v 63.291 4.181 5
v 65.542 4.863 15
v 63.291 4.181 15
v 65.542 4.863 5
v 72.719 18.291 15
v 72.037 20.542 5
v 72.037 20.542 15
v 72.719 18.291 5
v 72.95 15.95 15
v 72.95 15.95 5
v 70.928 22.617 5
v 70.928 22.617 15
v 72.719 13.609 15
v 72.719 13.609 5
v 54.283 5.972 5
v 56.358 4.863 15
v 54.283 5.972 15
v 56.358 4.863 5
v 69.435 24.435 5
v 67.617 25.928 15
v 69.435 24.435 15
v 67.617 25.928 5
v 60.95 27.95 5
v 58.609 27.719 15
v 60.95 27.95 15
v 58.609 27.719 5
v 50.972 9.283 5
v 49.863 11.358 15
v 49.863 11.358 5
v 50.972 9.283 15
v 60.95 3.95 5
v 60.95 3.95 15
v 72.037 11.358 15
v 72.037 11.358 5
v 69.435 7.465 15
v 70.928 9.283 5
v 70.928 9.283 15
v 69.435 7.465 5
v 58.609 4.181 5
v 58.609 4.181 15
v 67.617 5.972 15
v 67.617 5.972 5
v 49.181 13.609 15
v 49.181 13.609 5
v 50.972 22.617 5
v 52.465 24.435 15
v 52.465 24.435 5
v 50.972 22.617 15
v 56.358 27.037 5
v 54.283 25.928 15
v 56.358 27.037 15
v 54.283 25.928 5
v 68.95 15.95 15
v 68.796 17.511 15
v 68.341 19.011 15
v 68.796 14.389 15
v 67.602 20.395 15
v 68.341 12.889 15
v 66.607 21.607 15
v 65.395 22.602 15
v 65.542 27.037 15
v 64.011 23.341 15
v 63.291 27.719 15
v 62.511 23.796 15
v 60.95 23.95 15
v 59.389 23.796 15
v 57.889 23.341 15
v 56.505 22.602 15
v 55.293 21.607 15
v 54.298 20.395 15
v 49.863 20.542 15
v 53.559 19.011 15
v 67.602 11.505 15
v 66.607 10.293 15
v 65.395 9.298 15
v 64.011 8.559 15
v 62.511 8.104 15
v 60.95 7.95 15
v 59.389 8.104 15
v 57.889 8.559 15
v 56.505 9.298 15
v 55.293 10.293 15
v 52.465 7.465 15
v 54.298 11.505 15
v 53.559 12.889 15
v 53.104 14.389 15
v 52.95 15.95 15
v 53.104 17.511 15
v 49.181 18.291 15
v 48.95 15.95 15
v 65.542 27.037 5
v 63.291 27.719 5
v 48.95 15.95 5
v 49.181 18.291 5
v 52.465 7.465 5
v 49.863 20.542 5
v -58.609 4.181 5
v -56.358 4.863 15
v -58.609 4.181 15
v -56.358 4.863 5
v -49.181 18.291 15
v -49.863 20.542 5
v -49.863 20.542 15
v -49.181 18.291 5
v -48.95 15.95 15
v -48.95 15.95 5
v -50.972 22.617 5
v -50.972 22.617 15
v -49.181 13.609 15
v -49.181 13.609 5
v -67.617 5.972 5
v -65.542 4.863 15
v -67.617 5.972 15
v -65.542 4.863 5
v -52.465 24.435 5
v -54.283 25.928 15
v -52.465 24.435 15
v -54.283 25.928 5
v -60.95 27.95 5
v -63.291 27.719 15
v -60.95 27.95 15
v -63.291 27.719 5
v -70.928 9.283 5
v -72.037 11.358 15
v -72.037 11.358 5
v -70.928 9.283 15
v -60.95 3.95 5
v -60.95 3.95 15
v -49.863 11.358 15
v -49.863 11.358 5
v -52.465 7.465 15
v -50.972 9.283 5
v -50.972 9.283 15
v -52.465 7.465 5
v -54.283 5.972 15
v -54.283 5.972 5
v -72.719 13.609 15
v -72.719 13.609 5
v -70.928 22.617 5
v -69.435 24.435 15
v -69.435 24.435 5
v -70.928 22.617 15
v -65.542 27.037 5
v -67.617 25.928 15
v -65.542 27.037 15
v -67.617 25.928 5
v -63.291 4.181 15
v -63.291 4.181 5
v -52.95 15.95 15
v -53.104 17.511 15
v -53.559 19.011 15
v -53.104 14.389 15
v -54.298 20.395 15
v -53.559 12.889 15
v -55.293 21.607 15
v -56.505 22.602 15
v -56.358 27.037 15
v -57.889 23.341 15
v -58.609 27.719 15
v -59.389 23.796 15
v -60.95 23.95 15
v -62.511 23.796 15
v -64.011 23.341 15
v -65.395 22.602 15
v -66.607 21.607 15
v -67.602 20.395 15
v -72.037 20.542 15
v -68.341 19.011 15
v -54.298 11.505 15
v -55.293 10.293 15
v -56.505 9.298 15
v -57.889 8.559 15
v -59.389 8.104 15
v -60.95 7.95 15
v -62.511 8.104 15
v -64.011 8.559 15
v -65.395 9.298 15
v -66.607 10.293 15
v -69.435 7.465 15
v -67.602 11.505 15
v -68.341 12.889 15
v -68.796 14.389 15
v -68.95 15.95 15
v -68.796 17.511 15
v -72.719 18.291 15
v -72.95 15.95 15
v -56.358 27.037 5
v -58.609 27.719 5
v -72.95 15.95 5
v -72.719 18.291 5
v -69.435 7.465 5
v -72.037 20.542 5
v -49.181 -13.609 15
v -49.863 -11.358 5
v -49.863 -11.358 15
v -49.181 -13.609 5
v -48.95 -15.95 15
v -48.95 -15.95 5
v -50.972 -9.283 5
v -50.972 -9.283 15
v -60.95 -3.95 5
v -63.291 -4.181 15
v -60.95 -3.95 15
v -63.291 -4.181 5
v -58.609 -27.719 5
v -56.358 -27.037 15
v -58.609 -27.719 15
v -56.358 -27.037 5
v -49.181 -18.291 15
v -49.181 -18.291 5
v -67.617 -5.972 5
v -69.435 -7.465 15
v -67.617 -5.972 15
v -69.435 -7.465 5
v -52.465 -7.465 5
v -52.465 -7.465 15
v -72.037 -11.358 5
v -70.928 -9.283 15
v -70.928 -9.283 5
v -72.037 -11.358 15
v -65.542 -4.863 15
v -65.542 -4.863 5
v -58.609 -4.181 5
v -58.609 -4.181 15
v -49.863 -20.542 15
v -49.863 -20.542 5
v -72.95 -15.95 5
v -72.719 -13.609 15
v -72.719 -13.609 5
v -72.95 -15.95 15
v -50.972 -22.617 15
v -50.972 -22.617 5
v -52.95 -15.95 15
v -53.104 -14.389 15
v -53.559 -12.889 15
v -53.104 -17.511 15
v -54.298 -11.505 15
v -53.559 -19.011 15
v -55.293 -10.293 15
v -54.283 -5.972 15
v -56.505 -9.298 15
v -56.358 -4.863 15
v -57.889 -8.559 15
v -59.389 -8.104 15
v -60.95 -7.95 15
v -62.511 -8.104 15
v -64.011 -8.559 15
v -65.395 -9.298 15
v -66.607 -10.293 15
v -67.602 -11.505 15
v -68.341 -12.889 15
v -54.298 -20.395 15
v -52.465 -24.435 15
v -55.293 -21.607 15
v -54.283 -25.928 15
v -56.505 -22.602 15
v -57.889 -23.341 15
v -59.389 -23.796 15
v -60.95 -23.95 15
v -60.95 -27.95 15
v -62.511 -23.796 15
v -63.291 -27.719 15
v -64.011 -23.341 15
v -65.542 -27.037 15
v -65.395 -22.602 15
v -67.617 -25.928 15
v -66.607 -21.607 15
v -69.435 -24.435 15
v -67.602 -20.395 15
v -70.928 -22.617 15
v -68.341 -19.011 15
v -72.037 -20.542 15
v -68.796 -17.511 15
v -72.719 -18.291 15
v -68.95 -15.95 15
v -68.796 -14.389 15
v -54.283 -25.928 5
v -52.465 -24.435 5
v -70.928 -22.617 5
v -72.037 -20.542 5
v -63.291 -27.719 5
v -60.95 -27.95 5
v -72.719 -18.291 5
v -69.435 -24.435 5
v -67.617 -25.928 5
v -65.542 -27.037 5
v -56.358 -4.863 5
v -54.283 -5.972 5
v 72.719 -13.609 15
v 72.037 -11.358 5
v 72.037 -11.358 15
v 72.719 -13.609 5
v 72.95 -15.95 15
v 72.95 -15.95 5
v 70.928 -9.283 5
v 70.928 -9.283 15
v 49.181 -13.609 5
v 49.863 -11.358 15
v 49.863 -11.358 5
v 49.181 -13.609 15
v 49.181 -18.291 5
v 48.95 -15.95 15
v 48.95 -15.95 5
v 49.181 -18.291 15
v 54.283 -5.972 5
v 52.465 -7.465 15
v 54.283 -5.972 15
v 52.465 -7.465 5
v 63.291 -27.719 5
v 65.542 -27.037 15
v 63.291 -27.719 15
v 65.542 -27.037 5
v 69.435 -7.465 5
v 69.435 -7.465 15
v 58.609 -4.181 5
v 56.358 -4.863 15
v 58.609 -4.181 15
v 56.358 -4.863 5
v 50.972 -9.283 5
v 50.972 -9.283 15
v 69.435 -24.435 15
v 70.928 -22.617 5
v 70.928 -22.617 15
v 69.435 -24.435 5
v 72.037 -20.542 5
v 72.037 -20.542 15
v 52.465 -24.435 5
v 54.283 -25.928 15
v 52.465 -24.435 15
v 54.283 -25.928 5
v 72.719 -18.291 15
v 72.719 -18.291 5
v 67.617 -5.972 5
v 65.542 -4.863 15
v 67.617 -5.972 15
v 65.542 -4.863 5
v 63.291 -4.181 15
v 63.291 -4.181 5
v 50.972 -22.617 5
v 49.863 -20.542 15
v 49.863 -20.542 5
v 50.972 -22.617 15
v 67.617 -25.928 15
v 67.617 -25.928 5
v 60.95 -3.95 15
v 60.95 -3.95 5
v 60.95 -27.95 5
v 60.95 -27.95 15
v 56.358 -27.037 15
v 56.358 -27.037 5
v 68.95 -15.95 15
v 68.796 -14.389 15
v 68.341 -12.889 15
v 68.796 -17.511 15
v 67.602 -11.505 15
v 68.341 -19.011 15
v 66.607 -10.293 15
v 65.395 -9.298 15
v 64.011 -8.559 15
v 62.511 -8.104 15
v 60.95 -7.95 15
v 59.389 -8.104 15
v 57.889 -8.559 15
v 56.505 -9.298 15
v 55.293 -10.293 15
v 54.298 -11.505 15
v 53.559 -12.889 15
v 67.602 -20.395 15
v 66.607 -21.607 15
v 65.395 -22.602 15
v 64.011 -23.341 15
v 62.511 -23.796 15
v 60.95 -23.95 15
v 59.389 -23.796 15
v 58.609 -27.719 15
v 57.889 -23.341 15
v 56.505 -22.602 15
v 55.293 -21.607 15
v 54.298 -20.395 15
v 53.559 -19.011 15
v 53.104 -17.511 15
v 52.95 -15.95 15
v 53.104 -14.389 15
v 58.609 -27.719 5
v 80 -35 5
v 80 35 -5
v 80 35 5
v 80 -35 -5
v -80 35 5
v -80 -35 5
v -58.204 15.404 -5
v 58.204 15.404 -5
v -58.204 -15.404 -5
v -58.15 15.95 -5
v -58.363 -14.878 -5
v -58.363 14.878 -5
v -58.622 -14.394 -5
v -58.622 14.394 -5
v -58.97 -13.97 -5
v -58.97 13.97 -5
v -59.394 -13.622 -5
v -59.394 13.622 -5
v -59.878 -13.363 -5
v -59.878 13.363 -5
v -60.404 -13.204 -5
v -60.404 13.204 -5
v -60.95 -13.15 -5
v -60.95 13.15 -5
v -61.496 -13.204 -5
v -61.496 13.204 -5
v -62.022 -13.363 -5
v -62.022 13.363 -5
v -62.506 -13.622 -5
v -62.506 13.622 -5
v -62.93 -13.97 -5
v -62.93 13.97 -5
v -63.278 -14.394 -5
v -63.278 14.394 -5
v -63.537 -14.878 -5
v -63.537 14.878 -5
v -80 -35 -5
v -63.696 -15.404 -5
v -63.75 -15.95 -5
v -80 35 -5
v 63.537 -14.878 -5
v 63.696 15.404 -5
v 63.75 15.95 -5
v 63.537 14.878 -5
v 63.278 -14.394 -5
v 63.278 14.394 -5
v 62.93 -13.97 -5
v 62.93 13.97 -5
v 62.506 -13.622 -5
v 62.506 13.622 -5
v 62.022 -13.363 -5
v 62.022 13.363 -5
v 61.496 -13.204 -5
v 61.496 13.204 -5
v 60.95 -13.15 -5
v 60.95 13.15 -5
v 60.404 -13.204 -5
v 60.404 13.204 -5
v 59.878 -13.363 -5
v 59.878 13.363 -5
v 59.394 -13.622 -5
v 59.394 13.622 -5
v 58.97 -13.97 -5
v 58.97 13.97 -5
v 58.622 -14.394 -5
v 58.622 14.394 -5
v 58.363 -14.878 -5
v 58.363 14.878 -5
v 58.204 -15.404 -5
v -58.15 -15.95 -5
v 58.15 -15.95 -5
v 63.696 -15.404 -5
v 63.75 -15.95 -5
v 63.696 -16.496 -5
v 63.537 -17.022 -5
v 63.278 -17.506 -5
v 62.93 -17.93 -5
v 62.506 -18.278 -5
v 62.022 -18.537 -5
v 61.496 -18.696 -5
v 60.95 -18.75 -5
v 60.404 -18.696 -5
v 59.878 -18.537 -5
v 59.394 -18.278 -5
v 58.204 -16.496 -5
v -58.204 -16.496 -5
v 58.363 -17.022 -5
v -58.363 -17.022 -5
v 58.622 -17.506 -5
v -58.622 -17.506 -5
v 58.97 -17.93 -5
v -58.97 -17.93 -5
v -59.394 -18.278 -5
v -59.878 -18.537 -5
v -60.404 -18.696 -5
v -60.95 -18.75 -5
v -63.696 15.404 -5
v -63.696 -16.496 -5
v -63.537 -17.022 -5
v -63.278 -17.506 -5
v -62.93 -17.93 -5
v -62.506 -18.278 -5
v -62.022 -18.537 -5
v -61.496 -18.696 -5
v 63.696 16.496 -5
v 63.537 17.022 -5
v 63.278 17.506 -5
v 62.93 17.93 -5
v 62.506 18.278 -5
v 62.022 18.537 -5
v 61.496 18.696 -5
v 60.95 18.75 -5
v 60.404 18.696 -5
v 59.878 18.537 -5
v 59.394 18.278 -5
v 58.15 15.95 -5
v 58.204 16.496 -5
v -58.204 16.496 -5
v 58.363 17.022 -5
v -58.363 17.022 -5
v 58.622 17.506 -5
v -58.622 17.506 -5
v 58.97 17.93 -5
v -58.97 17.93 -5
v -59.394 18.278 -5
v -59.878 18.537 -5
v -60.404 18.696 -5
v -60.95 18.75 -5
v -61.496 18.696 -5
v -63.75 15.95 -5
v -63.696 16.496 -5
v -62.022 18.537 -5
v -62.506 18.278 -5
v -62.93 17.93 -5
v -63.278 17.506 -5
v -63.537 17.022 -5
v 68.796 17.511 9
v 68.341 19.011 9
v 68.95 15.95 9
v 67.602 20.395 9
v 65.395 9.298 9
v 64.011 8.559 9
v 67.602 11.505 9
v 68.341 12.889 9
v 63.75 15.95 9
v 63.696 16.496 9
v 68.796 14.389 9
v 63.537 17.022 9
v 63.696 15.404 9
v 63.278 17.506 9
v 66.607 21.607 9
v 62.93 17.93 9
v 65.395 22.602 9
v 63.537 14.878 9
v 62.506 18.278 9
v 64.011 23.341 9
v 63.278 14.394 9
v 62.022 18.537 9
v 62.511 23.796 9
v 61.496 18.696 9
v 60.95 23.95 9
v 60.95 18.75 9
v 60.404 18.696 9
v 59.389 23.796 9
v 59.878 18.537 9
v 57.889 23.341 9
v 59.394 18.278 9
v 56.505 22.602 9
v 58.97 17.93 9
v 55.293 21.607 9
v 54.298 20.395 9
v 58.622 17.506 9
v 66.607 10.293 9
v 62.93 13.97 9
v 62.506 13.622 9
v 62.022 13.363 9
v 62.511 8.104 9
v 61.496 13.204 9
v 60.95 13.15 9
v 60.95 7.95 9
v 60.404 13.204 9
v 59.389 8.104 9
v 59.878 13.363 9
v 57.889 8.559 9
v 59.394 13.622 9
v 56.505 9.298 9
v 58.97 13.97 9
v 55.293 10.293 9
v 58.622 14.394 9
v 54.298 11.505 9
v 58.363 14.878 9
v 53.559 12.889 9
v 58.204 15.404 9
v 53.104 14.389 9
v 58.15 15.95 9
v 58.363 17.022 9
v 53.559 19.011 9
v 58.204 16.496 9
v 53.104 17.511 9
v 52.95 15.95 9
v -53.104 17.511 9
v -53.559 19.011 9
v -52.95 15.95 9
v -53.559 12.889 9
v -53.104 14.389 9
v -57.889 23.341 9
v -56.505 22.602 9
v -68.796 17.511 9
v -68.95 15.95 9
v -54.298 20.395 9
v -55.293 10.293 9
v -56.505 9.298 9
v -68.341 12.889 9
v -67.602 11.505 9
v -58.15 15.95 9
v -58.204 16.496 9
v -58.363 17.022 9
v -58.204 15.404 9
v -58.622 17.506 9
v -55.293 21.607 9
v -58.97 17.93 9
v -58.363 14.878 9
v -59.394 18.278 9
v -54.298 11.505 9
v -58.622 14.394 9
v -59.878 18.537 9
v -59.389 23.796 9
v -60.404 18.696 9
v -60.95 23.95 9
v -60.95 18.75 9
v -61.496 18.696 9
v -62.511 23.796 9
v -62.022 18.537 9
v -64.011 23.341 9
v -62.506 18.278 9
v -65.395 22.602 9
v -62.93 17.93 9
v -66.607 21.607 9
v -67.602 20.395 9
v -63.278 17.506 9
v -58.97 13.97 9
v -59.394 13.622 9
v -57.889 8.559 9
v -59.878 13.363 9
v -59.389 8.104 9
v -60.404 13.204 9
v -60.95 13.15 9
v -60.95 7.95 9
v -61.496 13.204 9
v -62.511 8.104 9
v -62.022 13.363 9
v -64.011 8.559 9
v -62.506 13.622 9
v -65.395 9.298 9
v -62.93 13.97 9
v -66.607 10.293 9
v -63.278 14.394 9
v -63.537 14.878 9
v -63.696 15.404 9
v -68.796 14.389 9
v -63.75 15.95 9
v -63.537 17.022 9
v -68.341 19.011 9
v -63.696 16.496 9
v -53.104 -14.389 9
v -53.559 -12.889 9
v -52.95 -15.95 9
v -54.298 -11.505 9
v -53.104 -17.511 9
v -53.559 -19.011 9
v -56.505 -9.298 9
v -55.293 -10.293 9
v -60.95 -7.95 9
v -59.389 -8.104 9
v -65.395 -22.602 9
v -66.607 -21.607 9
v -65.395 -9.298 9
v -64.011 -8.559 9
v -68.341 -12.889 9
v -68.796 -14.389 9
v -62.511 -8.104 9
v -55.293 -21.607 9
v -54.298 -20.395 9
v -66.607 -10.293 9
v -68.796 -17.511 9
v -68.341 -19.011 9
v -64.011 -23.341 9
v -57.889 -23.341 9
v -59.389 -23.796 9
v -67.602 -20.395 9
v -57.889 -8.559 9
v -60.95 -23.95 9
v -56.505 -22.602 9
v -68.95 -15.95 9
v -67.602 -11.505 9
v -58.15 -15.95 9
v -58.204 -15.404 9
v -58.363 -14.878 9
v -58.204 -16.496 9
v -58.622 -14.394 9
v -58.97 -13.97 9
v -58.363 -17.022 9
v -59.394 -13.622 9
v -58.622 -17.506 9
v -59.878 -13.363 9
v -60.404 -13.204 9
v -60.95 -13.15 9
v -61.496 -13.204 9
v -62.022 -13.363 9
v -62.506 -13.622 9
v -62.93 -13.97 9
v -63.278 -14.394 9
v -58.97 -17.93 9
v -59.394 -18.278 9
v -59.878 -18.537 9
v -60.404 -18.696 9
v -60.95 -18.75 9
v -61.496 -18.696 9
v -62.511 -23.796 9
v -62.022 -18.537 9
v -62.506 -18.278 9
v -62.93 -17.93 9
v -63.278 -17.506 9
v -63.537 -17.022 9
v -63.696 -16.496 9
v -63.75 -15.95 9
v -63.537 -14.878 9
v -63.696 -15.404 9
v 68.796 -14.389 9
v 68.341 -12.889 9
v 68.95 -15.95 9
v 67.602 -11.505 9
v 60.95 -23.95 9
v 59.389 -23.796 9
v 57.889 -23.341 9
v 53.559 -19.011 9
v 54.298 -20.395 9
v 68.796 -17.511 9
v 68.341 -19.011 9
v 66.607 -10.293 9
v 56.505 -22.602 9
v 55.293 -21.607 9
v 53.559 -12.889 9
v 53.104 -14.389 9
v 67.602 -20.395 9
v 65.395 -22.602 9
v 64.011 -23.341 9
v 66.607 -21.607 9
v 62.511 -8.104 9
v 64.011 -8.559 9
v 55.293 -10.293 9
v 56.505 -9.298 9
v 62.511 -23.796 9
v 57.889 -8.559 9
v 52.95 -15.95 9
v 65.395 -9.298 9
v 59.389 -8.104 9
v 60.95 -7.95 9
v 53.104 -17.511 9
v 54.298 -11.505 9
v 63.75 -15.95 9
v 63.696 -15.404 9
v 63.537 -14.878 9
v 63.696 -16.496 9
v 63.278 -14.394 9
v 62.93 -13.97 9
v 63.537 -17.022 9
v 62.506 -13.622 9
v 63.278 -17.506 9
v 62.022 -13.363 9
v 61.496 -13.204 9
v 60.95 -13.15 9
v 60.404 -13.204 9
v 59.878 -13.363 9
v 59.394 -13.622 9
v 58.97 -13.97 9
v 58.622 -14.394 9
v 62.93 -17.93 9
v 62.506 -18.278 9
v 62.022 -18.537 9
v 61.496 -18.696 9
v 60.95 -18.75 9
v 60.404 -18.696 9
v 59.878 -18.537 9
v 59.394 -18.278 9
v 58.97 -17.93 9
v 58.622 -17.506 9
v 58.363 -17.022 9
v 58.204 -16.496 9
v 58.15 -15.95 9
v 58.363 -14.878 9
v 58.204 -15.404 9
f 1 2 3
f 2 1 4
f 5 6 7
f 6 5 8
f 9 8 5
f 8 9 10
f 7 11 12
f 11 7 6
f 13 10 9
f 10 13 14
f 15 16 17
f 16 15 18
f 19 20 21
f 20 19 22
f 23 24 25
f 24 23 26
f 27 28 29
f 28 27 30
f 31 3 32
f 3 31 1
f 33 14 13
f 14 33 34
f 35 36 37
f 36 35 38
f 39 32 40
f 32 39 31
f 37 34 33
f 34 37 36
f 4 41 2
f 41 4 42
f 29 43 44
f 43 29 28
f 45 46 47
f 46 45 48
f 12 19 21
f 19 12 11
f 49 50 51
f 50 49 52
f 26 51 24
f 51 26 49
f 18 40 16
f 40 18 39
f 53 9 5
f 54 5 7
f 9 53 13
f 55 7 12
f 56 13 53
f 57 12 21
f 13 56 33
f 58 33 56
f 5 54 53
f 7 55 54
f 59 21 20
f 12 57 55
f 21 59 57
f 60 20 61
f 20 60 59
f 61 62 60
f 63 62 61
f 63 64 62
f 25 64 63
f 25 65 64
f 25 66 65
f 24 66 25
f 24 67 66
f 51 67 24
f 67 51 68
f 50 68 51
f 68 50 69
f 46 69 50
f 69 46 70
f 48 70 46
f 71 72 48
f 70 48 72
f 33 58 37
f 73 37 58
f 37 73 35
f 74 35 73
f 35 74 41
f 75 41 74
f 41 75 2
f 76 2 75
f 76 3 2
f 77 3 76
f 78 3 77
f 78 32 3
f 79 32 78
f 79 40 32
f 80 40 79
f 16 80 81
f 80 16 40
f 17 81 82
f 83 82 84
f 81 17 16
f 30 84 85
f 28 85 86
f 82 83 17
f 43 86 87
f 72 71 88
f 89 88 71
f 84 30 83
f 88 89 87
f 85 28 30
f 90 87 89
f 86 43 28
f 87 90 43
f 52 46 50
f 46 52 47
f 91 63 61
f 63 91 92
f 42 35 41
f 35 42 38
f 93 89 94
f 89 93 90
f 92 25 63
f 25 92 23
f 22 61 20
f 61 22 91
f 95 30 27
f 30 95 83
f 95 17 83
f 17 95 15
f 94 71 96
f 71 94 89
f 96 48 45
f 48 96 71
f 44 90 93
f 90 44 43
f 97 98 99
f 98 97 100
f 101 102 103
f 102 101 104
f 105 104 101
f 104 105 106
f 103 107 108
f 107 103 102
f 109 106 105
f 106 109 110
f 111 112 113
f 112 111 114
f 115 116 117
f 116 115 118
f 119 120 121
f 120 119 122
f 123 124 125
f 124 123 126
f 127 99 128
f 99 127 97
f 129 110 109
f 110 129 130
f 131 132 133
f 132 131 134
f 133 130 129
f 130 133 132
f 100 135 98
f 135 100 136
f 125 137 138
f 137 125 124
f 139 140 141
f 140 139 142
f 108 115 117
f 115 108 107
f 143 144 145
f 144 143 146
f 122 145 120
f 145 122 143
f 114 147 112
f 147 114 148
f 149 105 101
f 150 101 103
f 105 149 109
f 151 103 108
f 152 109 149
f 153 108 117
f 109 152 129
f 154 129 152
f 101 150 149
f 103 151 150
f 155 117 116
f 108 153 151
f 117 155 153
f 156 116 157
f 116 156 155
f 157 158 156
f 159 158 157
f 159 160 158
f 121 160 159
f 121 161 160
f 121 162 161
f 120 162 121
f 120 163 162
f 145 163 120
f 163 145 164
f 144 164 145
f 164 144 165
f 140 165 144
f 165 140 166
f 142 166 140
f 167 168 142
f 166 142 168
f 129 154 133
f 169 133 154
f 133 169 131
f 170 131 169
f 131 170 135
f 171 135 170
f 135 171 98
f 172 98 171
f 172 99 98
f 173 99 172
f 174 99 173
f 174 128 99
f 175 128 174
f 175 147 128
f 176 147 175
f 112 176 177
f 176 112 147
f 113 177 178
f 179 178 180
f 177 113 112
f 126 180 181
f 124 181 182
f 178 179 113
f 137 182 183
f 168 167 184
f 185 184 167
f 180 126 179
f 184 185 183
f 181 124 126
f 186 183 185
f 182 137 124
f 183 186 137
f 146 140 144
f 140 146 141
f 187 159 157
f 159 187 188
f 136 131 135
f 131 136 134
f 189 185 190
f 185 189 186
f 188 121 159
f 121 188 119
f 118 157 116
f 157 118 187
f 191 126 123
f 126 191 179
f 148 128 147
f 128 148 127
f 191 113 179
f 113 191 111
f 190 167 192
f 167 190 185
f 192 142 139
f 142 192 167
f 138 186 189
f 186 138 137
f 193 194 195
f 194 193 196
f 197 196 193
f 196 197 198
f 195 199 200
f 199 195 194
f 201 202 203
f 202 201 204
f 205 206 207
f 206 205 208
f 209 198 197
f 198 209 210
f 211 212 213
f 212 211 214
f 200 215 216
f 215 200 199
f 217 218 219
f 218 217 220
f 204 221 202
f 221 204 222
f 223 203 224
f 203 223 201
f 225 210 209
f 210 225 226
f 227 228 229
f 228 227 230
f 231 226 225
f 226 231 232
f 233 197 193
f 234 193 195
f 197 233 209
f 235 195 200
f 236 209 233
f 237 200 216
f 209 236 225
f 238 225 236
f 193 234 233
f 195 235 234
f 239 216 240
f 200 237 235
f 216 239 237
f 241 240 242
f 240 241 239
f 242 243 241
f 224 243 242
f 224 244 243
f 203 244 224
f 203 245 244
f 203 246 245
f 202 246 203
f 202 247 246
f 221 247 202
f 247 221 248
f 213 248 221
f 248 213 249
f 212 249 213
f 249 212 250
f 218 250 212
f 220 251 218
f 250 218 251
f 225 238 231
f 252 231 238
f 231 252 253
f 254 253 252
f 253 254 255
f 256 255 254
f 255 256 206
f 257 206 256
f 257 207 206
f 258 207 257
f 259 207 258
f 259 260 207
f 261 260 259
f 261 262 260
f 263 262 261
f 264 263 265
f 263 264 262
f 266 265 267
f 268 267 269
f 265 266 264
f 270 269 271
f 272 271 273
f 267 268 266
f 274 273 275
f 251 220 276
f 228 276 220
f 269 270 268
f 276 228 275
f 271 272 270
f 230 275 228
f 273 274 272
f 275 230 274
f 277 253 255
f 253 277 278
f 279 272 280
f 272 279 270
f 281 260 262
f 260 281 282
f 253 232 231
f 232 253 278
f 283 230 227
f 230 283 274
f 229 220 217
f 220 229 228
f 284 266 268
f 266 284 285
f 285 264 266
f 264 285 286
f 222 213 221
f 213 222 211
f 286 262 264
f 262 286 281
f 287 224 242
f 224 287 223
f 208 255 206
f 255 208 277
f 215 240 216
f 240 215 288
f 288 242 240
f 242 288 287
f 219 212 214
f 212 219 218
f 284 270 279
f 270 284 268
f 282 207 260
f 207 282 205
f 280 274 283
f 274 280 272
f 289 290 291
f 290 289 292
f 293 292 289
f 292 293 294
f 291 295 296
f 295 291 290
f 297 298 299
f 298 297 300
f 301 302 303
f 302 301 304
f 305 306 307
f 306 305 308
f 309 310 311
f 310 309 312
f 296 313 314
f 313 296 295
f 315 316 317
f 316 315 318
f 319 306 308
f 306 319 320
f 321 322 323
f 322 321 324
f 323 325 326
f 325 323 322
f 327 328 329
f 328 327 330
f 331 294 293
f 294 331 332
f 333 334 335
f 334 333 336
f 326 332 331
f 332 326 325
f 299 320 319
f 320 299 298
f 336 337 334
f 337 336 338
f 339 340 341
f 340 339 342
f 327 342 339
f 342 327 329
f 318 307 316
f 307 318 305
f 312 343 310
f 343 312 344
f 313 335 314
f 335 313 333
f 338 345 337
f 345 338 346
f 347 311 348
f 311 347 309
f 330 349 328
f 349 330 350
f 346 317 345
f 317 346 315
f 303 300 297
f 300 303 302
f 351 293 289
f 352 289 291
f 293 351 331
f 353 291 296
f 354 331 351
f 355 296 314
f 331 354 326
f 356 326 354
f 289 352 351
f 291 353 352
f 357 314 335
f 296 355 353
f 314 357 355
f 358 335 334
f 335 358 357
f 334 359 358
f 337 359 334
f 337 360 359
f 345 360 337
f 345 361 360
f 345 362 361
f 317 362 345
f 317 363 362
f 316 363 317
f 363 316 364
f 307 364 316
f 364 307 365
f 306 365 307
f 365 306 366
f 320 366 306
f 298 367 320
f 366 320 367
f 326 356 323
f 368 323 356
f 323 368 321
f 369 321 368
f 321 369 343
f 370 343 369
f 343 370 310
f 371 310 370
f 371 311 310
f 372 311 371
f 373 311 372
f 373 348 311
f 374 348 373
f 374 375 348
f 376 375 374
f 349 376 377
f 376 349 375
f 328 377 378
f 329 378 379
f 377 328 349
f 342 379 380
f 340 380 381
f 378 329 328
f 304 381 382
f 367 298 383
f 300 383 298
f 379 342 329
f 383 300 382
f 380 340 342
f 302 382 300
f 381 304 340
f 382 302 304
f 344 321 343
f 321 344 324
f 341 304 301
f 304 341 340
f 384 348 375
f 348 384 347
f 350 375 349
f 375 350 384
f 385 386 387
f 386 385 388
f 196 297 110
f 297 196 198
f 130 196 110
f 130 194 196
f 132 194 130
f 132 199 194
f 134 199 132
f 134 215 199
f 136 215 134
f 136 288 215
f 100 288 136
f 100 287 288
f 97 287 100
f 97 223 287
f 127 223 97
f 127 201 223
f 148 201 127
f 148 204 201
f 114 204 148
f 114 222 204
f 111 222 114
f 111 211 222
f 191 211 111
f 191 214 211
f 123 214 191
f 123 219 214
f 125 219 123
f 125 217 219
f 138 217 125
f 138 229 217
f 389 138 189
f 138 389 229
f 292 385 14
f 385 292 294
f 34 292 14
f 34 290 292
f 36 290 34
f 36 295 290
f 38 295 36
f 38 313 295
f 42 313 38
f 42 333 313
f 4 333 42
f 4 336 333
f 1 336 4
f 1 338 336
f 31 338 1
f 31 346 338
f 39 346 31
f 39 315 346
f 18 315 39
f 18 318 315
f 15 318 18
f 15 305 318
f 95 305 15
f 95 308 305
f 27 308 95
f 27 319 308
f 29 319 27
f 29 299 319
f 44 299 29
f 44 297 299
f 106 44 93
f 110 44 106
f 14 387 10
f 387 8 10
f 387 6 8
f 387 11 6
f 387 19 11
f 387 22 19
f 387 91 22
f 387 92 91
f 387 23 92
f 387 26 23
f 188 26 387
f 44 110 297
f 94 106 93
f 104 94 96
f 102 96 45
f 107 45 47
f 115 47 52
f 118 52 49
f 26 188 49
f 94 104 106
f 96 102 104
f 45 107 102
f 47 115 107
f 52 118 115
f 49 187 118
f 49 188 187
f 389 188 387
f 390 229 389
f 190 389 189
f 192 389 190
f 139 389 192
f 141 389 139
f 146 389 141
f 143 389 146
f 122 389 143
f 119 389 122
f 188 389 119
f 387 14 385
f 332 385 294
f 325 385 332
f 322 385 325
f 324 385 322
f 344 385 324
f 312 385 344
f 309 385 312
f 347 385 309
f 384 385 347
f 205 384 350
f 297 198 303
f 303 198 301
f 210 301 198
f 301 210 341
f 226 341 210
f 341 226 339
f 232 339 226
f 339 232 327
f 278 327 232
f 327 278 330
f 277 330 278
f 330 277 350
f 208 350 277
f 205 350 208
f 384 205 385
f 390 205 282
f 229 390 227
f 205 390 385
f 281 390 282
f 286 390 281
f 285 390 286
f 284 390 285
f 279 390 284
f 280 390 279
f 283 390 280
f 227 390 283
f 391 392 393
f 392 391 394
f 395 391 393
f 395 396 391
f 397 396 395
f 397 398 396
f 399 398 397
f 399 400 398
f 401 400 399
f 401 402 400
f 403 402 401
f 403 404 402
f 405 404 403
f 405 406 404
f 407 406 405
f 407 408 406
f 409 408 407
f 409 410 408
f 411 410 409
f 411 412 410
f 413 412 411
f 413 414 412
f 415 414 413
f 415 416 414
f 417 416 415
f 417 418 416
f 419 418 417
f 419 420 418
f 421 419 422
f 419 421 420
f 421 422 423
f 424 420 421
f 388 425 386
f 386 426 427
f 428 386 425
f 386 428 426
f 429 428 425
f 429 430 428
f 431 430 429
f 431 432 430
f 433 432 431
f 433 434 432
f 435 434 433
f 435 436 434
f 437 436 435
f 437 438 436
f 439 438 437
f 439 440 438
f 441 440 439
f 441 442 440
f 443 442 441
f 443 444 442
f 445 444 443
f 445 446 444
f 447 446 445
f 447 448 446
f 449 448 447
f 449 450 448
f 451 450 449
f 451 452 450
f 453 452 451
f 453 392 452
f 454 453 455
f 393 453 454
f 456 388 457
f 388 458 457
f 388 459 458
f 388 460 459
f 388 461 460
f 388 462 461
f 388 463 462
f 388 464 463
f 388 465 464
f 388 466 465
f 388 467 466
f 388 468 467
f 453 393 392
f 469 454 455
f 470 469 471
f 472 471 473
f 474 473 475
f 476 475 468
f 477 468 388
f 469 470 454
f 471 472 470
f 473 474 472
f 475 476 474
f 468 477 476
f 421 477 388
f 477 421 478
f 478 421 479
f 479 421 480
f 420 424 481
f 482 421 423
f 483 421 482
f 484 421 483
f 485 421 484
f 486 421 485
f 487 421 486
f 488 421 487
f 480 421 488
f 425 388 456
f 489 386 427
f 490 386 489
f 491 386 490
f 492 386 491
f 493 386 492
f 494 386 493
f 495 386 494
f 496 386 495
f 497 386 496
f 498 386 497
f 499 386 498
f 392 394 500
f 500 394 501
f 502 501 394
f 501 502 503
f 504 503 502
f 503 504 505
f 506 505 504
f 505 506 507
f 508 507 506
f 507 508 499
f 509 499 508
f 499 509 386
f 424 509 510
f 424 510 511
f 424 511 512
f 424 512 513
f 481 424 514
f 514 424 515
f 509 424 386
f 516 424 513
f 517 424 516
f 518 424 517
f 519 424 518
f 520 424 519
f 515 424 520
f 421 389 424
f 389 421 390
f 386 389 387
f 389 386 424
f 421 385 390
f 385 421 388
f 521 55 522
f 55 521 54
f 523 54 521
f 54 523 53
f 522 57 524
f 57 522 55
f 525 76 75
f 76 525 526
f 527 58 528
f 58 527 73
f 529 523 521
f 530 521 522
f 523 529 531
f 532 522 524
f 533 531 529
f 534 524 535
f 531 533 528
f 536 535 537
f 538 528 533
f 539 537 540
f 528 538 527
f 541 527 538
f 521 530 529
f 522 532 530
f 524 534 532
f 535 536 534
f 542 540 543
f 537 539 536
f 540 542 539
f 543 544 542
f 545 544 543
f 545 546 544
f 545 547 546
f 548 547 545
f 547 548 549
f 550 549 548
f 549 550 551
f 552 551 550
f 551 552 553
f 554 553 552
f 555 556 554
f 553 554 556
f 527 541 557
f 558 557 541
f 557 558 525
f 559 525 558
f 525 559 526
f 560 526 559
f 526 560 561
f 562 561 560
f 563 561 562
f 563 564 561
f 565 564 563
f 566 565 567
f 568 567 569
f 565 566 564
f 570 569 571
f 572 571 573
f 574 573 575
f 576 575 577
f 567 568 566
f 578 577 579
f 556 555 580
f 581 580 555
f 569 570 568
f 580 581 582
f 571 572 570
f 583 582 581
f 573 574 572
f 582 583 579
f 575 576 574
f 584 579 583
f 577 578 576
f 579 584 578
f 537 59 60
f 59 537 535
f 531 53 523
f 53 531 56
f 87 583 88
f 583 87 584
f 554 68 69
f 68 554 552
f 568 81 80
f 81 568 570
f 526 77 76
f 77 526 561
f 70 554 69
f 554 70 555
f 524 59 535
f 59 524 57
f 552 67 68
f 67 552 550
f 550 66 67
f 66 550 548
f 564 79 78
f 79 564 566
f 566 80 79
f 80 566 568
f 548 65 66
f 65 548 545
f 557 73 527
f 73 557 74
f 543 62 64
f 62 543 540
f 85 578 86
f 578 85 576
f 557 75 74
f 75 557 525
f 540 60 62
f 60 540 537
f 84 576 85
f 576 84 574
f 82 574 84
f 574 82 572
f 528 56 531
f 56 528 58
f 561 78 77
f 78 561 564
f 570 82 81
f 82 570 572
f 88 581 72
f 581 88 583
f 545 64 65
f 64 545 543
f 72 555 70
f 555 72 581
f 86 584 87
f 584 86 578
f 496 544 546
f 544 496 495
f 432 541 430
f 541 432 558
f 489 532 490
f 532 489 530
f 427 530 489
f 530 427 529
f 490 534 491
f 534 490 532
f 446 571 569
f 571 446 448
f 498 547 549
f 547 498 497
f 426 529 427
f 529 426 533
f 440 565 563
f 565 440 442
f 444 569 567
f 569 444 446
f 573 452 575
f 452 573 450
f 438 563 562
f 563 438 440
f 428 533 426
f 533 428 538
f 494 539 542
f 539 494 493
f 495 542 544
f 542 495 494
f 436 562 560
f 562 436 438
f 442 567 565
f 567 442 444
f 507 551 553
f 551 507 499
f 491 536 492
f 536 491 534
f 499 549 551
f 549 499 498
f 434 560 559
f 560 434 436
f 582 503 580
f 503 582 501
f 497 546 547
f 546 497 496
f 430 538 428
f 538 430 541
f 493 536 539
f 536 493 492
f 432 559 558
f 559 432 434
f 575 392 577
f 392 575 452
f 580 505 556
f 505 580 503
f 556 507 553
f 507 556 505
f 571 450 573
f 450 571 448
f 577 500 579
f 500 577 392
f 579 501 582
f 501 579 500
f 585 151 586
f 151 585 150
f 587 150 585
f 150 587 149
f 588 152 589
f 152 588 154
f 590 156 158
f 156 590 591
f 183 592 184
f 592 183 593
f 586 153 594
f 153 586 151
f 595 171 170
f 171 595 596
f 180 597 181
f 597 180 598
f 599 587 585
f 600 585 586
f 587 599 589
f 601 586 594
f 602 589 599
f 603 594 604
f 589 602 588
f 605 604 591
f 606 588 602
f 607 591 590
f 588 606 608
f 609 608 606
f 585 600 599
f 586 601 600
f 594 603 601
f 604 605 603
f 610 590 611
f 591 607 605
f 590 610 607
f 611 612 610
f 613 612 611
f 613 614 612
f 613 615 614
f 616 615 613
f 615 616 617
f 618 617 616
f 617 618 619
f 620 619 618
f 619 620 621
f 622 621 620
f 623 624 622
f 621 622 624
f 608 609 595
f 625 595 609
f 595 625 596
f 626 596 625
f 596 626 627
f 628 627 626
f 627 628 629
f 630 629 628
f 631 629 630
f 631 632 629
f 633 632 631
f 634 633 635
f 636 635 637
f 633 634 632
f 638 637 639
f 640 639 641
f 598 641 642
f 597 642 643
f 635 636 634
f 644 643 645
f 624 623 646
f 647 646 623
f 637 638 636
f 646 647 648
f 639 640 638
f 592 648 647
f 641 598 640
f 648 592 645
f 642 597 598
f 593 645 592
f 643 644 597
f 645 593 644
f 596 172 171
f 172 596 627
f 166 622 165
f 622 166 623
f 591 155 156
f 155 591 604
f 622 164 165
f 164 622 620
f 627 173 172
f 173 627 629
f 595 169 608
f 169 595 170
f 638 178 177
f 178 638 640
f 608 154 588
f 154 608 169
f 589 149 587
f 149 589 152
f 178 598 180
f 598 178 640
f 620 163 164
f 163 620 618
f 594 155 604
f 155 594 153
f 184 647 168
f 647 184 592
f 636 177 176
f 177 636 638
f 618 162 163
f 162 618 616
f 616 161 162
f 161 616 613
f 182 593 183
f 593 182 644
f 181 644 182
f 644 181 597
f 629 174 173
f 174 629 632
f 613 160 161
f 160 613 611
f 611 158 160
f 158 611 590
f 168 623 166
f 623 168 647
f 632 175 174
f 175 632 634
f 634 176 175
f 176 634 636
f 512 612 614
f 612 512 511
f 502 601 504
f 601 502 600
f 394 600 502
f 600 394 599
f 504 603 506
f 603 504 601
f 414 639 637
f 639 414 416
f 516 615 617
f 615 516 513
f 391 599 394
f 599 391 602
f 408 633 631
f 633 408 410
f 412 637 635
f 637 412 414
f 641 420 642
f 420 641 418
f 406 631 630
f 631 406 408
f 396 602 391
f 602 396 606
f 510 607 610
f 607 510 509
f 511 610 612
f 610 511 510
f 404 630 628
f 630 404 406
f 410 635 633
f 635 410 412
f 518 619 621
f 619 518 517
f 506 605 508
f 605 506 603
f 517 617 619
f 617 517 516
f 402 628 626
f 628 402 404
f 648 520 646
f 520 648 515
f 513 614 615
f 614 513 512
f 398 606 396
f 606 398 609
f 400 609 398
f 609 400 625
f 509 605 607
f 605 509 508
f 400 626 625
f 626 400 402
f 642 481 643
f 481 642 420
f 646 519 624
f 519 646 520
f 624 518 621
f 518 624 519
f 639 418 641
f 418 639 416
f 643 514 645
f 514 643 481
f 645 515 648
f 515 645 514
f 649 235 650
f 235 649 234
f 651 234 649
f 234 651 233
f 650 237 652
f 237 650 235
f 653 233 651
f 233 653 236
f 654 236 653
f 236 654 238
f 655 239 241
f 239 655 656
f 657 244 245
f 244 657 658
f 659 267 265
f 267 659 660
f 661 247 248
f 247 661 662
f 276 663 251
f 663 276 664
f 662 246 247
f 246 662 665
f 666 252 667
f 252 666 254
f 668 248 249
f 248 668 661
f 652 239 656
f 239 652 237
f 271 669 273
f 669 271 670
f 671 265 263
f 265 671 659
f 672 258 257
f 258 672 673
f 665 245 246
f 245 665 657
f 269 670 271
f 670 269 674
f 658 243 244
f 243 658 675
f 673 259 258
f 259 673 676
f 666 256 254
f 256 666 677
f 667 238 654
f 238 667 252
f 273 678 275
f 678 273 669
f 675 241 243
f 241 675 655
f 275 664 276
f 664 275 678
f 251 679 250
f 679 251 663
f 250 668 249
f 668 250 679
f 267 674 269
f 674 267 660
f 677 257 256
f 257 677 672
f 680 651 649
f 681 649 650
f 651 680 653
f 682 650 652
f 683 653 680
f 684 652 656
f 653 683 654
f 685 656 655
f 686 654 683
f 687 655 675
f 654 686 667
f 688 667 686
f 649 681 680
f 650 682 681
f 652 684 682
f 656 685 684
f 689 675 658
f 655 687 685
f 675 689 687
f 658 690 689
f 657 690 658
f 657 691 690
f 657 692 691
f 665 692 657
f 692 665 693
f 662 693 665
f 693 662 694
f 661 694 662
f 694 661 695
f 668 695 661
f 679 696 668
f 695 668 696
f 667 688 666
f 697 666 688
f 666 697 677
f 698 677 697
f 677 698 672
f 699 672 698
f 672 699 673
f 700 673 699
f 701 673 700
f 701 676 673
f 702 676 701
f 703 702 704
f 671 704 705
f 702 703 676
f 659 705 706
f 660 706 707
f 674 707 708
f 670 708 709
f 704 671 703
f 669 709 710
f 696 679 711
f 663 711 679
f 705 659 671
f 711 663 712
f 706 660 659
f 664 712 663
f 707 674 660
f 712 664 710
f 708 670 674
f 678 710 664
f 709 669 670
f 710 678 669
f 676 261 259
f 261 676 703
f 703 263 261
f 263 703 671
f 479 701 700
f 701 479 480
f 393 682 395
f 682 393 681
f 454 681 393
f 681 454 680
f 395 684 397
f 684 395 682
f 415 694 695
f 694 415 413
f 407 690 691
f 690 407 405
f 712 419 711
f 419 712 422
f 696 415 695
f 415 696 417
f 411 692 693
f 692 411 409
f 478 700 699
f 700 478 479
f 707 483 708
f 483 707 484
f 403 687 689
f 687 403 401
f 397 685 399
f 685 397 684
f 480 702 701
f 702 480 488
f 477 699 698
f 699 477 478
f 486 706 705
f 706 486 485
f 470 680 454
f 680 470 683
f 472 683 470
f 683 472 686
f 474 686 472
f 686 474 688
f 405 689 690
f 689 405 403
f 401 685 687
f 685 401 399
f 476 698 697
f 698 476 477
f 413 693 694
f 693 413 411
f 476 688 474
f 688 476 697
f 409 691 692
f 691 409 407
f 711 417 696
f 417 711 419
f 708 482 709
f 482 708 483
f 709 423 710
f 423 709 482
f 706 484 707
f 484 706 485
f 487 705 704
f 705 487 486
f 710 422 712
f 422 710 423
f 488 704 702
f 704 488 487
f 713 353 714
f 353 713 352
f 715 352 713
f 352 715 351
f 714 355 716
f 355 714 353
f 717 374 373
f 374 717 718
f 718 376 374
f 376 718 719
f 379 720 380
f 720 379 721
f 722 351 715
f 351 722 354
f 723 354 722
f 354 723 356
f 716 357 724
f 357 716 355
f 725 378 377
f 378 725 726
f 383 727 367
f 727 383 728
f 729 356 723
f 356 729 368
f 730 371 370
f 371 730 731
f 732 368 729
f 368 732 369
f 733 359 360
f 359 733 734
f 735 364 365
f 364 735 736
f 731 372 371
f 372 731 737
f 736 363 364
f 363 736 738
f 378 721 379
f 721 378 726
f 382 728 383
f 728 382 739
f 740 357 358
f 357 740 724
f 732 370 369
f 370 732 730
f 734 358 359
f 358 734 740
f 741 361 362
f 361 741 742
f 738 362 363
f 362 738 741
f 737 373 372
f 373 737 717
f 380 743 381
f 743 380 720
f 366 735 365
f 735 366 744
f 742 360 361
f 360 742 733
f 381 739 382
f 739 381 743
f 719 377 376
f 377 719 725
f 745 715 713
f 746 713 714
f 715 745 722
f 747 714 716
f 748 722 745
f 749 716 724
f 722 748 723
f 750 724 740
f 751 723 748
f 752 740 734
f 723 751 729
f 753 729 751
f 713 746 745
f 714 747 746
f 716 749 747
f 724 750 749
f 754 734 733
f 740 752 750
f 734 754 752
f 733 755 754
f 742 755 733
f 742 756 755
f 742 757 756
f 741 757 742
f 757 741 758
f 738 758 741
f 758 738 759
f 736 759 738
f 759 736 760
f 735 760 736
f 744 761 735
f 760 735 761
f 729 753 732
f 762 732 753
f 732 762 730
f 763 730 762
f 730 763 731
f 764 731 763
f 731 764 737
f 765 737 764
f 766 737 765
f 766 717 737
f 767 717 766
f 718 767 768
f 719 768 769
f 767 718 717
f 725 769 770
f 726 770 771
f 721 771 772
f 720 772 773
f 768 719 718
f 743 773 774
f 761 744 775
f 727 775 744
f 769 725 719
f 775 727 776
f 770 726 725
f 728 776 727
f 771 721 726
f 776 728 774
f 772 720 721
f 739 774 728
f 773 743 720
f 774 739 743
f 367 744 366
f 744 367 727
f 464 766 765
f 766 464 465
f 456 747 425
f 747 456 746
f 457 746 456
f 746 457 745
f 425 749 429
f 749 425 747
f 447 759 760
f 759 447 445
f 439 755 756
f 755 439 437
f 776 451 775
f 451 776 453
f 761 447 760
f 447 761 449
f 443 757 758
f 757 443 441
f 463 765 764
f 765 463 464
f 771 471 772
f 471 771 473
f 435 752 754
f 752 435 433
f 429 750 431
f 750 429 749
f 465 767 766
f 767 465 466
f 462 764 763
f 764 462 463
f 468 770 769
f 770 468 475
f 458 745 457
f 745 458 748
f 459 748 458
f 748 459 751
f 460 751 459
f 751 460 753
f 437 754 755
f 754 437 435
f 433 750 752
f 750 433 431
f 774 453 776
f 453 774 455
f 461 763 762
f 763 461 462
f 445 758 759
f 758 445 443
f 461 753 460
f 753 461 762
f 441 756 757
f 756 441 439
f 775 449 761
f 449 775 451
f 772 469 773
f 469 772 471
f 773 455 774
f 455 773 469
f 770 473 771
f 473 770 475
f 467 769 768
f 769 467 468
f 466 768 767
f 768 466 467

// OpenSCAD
$fn = 32;

// ----------------------------------------------------------------------
// Socket pad plate
// bosses with counterbored sockets for the screws
// ----------------------------------------------------------------------

// --- parameters (mm) ---
base_t = 10;            // base plate thickness
boss_h = 10;            // boss height above the base plate
boss_d = 24;            // boss diameter
socket_d = 16;          // socket diameter
socket_depth = 6;       // socket depth from the boss face
bolt_d = 5.6;           // screw clearance hole through the socket floor
plate = [160, 70, 10];  // overall size (x, y, z)
edge = 19.05;           // boss centre offset from the plate edge
pads = 4;               // boss count, one per corner

// --- derived feature positions (mm) ---
height = base_t + boss_h;        // = 20   overall height of the part
corner_x = plate[0] / 2 - edge;  // = 60.95   boss centre X
corner_y = plate[1] / 2 - edge;  // = 15.95   boss centre Y
feature_centers = [
  [corner_x, corner_y],
  [-corner_x, corner_y],
  [-corner_x, -corner_y],
  [corner_x, -corner_y]
];   // boss centres: sockets, holes and the pads themselves are placed from here

// base plate, bosses on feature_centers, socket + through hole in each
difference() {
  union() {
    cube(plate, center = true);
    for (centre = feature_centers)
      translate([centre[0], centre[1], plate[2] / 2 - 1])
        cylinder(d = boss_d, h = boss_h + 1);
  }
  for (centre = feature_centers) {
    translate([centre[0], centre[1], plate[2] / 2 + boss_h - socket_depth])
      cylinder(d = socket_d, h = socket_depth + 1);
    translate([centre[0], centre[1], -height])
      cylinder(d = bolt_d, h = 2 * height + 2);  // through the socket floor
  }
}
